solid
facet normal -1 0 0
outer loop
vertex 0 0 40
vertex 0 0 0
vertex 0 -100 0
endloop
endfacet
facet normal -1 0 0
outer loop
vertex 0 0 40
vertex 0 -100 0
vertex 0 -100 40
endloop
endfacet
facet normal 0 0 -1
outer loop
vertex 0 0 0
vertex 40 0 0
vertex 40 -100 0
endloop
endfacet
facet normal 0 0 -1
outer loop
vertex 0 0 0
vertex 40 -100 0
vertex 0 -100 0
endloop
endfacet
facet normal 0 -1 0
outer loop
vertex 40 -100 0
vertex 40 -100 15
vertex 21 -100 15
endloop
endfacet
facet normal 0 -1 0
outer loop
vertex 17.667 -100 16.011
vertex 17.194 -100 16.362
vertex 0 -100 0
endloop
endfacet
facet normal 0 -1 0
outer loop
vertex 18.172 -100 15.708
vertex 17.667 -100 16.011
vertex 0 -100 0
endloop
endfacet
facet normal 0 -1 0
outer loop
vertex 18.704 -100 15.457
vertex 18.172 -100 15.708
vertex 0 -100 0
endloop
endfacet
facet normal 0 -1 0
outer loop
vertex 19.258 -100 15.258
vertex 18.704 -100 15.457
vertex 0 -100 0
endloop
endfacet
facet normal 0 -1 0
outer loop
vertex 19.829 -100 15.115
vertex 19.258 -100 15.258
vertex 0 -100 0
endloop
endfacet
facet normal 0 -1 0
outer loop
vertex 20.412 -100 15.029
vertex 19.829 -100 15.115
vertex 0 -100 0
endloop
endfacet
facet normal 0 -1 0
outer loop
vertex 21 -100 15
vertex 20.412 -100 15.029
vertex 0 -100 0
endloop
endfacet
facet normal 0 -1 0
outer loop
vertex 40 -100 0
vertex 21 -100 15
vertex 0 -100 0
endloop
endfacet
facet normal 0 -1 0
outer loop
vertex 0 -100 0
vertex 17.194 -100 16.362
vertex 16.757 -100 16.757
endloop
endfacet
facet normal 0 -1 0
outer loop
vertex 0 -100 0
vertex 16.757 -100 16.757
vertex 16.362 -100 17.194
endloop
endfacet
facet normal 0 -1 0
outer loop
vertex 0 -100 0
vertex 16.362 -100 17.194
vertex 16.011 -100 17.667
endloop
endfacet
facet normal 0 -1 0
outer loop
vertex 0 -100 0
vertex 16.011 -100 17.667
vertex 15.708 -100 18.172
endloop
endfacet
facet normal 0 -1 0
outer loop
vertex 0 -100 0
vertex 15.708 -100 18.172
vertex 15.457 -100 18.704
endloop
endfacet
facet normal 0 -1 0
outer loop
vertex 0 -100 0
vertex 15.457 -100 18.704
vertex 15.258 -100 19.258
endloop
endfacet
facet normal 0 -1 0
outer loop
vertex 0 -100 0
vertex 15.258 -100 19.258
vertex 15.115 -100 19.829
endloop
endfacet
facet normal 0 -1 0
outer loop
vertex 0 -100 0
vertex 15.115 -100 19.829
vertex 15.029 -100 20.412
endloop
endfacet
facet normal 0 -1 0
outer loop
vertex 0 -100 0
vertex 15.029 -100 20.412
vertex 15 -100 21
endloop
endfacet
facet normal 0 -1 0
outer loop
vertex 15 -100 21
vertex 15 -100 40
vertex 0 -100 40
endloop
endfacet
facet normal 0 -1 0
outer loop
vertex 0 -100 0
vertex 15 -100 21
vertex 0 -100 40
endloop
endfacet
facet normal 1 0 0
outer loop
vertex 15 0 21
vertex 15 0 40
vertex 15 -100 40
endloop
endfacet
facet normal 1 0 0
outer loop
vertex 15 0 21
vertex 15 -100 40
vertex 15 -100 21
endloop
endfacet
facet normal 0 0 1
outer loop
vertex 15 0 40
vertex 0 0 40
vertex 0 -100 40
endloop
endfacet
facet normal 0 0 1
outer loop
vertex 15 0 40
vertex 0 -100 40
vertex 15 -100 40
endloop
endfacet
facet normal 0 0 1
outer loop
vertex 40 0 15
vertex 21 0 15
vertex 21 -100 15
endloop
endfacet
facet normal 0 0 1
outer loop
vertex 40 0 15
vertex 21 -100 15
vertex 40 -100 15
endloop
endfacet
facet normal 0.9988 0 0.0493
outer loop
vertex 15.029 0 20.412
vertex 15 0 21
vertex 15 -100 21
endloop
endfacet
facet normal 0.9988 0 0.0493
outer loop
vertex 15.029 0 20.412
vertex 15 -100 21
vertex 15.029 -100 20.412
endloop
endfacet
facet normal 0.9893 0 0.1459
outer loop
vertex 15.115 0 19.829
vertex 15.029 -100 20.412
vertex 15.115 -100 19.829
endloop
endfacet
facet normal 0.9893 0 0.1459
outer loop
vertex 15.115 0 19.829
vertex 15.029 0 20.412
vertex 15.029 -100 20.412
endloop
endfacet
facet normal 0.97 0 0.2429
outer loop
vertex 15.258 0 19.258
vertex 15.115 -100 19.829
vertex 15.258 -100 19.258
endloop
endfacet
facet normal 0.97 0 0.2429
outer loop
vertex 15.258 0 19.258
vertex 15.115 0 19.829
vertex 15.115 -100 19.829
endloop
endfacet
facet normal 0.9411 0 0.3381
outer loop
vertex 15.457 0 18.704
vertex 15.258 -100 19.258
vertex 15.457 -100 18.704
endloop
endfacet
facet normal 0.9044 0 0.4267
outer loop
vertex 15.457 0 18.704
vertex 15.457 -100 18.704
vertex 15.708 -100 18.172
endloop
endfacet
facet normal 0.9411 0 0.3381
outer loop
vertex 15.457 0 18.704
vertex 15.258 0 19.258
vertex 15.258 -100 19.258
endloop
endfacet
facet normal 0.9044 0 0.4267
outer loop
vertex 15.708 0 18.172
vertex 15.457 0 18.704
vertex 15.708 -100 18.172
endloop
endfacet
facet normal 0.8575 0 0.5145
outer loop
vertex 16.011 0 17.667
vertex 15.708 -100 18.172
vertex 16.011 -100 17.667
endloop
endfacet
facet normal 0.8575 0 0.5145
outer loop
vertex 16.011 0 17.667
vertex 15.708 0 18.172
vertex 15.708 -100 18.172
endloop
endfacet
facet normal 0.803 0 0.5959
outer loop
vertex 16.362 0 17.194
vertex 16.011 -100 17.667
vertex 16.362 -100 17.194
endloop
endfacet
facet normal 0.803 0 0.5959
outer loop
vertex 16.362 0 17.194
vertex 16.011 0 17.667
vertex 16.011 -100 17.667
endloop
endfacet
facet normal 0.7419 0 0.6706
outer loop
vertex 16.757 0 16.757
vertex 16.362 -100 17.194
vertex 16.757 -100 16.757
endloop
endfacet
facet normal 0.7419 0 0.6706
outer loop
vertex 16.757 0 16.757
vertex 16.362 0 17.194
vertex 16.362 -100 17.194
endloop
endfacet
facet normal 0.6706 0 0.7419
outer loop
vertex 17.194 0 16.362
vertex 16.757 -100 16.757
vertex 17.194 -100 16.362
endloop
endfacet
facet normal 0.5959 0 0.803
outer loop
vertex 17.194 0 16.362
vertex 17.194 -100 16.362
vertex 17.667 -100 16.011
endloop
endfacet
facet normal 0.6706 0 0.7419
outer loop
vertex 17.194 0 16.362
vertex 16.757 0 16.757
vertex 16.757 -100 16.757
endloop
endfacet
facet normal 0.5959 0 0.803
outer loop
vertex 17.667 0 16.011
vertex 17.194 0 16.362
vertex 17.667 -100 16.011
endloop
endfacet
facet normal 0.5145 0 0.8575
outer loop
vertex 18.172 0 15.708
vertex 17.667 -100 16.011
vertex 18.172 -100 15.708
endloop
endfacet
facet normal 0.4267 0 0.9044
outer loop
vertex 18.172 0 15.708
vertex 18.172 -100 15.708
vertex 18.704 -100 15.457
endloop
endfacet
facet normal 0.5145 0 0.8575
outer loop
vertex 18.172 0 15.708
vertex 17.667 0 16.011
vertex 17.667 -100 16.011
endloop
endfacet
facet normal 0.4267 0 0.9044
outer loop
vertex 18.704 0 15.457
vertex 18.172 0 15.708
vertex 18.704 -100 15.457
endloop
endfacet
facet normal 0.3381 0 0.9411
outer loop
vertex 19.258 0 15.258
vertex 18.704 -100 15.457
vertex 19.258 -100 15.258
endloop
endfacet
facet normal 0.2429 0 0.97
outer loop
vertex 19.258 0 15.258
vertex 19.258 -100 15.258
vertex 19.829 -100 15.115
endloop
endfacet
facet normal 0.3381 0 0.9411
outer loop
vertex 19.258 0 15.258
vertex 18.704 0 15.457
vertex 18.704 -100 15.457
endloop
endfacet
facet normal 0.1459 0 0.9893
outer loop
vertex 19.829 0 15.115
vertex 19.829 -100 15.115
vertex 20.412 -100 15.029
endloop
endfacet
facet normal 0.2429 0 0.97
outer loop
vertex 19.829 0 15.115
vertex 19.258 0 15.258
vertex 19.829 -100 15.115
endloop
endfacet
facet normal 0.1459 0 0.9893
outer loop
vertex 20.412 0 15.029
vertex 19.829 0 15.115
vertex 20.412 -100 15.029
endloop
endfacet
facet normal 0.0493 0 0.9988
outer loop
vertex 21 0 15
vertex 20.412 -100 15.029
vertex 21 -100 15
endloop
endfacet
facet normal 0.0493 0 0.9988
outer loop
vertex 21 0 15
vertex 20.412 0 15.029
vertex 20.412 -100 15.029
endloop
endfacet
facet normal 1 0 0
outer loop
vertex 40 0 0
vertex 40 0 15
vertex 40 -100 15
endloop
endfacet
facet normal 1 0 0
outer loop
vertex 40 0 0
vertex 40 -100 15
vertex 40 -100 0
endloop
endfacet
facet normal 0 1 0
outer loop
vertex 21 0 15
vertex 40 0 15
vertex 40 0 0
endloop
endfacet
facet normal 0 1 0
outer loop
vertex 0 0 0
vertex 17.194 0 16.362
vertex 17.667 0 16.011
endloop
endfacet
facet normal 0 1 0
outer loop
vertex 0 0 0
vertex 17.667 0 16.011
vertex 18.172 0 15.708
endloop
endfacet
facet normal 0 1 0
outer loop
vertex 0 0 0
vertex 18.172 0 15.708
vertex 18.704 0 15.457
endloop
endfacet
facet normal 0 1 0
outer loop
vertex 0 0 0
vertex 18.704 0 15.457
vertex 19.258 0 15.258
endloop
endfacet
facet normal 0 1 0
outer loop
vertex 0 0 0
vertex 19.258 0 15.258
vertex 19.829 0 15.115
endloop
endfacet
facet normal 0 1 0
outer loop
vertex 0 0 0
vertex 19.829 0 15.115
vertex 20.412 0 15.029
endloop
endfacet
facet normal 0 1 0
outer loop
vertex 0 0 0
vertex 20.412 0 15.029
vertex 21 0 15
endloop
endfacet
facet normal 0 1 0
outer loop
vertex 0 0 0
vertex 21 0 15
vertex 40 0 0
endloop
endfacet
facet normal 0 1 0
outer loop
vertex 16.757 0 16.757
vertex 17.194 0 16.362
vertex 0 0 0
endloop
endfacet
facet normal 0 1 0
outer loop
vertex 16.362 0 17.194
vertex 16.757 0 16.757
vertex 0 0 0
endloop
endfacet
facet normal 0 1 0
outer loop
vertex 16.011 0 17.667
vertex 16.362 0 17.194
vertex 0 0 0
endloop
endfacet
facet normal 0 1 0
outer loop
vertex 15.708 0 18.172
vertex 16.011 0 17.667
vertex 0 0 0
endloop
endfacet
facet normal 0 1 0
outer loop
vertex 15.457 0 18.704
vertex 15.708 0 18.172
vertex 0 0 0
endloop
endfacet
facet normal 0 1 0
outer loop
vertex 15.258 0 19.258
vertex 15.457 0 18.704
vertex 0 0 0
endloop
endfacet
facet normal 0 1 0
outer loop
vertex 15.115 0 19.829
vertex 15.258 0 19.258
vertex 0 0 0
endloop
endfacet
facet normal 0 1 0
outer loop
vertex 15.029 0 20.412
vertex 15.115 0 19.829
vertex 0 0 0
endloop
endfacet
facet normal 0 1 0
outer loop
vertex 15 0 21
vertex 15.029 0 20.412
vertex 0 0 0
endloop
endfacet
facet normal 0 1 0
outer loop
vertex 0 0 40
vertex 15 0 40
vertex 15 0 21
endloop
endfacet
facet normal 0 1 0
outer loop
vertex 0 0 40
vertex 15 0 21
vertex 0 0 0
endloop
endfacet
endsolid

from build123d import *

# Parameters (mm, degrees)
PAD_DEPTH = 100


with BuildPart() as part:
    # Sketch → Pad (new body)
    with BuildSketch(Plane.XZ):
        with BuildLine():
            Line((0, 0), (0, 40))
            Line((0, 40), (15, 40))
            Line((15, 40), (15, 21))
            ThreePointArc((15, 21), (16.757359, 16.757359), (21, 15))
            Line((21, 15), (40, 15))
            Line((40, 15), (40, 0))
            Line((40, 0), (0, 0))
        make_face()
    extrude(amount=PAD_DEPTH)


solid = part.part
